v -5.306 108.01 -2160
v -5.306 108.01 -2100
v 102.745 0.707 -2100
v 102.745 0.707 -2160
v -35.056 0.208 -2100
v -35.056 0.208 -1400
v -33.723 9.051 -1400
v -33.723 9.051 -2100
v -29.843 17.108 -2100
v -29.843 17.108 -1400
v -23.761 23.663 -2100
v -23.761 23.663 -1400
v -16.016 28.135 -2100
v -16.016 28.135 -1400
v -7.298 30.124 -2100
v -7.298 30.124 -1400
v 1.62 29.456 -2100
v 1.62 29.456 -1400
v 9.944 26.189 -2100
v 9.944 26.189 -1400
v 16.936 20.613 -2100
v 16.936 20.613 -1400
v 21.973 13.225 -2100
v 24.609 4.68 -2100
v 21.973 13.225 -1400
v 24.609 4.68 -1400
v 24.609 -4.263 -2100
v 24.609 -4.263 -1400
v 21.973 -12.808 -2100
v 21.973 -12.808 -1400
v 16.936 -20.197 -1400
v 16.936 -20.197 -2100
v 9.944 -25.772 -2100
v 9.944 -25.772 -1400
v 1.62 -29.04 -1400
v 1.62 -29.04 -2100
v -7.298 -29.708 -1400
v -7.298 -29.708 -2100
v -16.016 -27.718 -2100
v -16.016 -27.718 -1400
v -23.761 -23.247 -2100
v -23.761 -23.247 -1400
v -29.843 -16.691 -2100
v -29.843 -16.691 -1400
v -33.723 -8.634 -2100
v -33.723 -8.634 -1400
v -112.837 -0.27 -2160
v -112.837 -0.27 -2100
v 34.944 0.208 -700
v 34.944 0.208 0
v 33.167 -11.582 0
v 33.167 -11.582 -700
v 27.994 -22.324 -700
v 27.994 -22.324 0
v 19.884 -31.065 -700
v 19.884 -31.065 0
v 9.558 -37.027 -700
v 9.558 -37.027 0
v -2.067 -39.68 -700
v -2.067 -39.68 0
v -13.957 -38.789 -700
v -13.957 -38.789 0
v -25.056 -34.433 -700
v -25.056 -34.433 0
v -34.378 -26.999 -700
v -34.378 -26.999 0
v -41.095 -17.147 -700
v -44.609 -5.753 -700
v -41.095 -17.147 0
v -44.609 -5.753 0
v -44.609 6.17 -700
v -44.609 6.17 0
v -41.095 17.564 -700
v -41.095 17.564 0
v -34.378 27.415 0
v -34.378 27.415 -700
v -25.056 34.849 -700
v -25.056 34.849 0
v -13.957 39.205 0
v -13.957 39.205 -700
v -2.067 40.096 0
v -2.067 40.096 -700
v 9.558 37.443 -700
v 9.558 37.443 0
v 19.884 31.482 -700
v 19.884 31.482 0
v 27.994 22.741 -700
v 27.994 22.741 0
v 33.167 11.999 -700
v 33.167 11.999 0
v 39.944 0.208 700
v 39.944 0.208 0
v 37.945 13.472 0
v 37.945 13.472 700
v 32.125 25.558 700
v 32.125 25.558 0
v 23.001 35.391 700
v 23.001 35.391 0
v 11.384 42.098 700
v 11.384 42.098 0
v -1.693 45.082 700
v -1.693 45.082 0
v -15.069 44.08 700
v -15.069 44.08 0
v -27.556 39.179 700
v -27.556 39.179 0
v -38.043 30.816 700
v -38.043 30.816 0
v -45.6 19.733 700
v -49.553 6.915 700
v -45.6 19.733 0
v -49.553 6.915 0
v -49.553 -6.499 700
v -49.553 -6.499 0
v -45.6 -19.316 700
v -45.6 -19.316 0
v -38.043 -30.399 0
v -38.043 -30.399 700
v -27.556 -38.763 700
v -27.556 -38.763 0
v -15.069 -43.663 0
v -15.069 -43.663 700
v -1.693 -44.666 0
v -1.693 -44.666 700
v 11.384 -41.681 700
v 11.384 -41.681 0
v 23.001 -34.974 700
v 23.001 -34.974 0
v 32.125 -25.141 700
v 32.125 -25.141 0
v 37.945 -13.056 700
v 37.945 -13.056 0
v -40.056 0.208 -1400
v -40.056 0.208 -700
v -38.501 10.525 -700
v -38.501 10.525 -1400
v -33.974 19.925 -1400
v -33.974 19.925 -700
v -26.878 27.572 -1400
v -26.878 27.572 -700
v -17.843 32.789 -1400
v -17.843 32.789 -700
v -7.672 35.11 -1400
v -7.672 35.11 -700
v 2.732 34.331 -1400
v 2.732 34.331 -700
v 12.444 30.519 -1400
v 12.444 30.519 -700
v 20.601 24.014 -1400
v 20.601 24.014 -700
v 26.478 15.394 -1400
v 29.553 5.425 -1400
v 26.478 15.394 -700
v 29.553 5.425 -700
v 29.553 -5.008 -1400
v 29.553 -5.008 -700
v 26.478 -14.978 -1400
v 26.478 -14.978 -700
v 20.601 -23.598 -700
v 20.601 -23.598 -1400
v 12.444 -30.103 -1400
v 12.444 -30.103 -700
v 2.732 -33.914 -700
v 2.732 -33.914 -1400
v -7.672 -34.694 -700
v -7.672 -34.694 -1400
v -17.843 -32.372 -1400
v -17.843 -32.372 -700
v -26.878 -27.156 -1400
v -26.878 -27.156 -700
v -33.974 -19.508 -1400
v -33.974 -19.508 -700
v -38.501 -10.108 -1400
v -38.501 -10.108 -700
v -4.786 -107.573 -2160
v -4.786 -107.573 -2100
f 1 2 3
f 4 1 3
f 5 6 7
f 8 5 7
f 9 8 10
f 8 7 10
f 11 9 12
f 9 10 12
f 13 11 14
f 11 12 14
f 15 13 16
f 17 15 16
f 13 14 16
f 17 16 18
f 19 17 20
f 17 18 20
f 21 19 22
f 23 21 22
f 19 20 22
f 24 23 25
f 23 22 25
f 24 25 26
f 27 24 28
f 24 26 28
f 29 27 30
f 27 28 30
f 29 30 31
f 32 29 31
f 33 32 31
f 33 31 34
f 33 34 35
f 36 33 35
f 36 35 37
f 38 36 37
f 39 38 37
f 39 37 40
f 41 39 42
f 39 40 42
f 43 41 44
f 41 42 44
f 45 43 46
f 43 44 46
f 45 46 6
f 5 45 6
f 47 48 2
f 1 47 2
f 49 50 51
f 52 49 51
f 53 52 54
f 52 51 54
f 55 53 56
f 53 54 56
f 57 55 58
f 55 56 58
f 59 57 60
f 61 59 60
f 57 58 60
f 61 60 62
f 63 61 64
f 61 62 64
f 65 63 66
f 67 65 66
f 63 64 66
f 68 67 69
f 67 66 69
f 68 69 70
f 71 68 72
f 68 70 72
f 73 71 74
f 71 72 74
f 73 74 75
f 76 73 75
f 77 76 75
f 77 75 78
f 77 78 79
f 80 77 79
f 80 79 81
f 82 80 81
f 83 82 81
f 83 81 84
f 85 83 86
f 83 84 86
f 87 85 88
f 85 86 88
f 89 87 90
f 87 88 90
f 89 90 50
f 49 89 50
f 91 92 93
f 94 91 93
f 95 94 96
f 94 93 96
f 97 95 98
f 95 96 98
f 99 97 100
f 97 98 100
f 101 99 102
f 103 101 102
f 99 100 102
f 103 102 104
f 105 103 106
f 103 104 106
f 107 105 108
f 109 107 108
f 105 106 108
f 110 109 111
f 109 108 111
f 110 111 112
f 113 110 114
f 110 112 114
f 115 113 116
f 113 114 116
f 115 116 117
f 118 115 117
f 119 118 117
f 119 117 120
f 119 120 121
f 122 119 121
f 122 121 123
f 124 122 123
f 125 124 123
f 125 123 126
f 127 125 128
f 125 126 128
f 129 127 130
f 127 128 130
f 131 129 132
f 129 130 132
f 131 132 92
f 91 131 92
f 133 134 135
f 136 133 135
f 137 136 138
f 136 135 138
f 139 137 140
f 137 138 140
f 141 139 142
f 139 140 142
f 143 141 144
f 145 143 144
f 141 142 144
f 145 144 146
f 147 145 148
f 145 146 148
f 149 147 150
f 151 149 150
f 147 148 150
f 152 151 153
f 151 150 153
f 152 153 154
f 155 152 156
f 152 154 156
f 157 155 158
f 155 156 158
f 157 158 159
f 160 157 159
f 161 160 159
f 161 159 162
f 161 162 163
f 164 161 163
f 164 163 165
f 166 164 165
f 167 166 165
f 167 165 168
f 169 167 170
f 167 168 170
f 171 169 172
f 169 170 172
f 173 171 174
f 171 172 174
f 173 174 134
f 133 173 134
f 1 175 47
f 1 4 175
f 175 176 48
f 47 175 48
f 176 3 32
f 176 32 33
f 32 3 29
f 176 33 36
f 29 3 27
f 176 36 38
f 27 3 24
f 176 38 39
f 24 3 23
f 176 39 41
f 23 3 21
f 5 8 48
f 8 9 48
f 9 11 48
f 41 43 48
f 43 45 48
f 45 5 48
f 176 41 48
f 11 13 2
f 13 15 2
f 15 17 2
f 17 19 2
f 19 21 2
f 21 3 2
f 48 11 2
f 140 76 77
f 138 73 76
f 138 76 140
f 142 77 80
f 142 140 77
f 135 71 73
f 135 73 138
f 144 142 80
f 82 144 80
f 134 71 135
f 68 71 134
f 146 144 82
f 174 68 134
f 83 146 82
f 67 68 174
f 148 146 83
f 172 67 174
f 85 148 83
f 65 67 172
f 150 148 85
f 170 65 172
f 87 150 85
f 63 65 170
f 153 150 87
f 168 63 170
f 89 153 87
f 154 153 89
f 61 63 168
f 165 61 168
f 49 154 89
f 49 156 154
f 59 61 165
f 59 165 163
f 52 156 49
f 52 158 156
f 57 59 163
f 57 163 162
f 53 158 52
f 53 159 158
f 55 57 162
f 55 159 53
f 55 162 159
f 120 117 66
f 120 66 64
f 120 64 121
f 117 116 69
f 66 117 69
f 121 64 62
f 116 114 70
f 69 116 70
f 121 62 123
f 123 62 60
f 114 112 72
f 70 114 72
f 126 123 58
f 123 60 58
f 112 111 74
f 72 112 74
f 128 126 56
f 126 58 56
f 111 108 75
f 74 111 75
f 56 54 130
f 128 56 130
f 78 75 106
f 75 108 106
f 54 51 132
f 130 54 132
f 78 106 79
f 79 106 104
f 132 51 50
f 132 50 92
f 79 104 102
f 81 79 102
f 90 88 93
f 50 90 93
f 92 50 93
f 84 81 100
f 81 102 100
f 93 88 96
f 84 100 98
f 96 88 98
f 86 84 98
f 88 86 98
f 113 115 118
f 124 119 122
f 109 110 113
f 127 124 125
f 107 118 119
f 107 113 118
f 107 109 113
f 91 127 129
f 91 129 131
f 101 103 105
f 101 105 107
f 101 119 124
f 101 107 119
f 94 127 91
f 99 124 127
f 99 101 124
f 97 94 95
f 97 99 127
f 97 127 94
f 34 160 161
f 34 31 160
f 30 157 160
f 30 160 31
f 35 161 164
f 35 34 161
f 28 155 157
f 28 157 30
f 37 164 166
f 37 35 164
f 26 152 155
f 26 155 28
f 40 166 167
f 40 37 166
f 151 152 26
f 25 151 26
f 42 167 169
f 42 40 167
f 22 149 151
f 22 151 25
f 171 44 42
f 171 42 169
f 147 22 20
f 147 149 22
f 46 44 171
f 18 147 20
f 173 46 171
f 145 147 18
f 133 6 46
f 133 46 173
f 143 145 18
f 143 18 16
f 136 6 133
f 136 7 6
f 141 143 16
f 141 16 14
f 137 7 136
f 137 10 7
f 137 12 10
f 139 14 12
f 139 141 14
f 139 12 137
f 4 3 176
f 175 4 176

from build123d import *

# Parameters (mm, degrees)
ESQUISSE1_R        = 45
BOSS_EXTRU_1_DEPTH = 700
ESQUISSE2_R        = 40
BOSS_EXTRU_4_DEPTH = 700
ESQUISSE3_R        = 35
BOSS_EXTRU_5_DEPTH = 700
ESQUISSE4_R        = 30
BOSS_EXTRU_6_DEPTH = 700
BOSS_EXTRU_7_DEPTH = 60


with BuildPart() as part:
    # Esquisse1 → Boss.-Extru.1 (new body)
    with BuildSketch(Plane.XY):
        with Locations((-5.0559795, 0.208317709)):
            Circle(ESQUISSE1_R)
    extrude(amount=BOSS_EXTRU_1_DEPTH)

    # Esquisse2 → Boss.-Extru.4 (add)
    with BuildSketch(Plane(origin=(0, 0, 0), x_dir=(-1, 0, 0), z_dir=(0, 0, -1))):
        with Locations(Location((5.0559795, 0.208317709, 0), (0, 0, 180))):
            Circle(ESQUISSE2_R)
    extrude(amount=BOSS_EXTRU_4_DEPTH)

    # Esquisse3 → Boss.-Extru.5 (add)
    with BuildSketch(Plane(origin=(0, 0, -700), x_dir=(-1, 0, 0), z_dir=(0, 0, -1))):
        with Locations((5.0559795, 0.208317709)):
            Circle(ESQUISSE3_R)
    extrude(amount=BOSS_EXTRU_5_DEPTH)

    # Esquisse4 → Boss.-Extru.6 (add)
    with BuildSketch(Plane(origin=(0, 0, -1400), x_dir=(-1, 0, 0), z_dir=(0, 0, -1))):
        with Locations((5.0559795, 0.208317709)):
            Circle(ESQUISSE4_R)
    extrude(amount=BOSS_EXTRU_6_DEPTH)

    # Esquisse5 → Boss.-Extru.7 (add)
    with BuildSketch(Plane(origin=(0, 0, -2100), x_dir=(-1, 0, 0), z_dir=(0, 0, -1))):
        Polygon((4.785922621, -107.572959404), (112.836533333, -0.270056879), (5.305557146, 108.010216758), (-102.745053566, 0.707314234), align=None)
    extrude(amount=BOSS_EXTRU_7_DEPTH)


solid = part.part
